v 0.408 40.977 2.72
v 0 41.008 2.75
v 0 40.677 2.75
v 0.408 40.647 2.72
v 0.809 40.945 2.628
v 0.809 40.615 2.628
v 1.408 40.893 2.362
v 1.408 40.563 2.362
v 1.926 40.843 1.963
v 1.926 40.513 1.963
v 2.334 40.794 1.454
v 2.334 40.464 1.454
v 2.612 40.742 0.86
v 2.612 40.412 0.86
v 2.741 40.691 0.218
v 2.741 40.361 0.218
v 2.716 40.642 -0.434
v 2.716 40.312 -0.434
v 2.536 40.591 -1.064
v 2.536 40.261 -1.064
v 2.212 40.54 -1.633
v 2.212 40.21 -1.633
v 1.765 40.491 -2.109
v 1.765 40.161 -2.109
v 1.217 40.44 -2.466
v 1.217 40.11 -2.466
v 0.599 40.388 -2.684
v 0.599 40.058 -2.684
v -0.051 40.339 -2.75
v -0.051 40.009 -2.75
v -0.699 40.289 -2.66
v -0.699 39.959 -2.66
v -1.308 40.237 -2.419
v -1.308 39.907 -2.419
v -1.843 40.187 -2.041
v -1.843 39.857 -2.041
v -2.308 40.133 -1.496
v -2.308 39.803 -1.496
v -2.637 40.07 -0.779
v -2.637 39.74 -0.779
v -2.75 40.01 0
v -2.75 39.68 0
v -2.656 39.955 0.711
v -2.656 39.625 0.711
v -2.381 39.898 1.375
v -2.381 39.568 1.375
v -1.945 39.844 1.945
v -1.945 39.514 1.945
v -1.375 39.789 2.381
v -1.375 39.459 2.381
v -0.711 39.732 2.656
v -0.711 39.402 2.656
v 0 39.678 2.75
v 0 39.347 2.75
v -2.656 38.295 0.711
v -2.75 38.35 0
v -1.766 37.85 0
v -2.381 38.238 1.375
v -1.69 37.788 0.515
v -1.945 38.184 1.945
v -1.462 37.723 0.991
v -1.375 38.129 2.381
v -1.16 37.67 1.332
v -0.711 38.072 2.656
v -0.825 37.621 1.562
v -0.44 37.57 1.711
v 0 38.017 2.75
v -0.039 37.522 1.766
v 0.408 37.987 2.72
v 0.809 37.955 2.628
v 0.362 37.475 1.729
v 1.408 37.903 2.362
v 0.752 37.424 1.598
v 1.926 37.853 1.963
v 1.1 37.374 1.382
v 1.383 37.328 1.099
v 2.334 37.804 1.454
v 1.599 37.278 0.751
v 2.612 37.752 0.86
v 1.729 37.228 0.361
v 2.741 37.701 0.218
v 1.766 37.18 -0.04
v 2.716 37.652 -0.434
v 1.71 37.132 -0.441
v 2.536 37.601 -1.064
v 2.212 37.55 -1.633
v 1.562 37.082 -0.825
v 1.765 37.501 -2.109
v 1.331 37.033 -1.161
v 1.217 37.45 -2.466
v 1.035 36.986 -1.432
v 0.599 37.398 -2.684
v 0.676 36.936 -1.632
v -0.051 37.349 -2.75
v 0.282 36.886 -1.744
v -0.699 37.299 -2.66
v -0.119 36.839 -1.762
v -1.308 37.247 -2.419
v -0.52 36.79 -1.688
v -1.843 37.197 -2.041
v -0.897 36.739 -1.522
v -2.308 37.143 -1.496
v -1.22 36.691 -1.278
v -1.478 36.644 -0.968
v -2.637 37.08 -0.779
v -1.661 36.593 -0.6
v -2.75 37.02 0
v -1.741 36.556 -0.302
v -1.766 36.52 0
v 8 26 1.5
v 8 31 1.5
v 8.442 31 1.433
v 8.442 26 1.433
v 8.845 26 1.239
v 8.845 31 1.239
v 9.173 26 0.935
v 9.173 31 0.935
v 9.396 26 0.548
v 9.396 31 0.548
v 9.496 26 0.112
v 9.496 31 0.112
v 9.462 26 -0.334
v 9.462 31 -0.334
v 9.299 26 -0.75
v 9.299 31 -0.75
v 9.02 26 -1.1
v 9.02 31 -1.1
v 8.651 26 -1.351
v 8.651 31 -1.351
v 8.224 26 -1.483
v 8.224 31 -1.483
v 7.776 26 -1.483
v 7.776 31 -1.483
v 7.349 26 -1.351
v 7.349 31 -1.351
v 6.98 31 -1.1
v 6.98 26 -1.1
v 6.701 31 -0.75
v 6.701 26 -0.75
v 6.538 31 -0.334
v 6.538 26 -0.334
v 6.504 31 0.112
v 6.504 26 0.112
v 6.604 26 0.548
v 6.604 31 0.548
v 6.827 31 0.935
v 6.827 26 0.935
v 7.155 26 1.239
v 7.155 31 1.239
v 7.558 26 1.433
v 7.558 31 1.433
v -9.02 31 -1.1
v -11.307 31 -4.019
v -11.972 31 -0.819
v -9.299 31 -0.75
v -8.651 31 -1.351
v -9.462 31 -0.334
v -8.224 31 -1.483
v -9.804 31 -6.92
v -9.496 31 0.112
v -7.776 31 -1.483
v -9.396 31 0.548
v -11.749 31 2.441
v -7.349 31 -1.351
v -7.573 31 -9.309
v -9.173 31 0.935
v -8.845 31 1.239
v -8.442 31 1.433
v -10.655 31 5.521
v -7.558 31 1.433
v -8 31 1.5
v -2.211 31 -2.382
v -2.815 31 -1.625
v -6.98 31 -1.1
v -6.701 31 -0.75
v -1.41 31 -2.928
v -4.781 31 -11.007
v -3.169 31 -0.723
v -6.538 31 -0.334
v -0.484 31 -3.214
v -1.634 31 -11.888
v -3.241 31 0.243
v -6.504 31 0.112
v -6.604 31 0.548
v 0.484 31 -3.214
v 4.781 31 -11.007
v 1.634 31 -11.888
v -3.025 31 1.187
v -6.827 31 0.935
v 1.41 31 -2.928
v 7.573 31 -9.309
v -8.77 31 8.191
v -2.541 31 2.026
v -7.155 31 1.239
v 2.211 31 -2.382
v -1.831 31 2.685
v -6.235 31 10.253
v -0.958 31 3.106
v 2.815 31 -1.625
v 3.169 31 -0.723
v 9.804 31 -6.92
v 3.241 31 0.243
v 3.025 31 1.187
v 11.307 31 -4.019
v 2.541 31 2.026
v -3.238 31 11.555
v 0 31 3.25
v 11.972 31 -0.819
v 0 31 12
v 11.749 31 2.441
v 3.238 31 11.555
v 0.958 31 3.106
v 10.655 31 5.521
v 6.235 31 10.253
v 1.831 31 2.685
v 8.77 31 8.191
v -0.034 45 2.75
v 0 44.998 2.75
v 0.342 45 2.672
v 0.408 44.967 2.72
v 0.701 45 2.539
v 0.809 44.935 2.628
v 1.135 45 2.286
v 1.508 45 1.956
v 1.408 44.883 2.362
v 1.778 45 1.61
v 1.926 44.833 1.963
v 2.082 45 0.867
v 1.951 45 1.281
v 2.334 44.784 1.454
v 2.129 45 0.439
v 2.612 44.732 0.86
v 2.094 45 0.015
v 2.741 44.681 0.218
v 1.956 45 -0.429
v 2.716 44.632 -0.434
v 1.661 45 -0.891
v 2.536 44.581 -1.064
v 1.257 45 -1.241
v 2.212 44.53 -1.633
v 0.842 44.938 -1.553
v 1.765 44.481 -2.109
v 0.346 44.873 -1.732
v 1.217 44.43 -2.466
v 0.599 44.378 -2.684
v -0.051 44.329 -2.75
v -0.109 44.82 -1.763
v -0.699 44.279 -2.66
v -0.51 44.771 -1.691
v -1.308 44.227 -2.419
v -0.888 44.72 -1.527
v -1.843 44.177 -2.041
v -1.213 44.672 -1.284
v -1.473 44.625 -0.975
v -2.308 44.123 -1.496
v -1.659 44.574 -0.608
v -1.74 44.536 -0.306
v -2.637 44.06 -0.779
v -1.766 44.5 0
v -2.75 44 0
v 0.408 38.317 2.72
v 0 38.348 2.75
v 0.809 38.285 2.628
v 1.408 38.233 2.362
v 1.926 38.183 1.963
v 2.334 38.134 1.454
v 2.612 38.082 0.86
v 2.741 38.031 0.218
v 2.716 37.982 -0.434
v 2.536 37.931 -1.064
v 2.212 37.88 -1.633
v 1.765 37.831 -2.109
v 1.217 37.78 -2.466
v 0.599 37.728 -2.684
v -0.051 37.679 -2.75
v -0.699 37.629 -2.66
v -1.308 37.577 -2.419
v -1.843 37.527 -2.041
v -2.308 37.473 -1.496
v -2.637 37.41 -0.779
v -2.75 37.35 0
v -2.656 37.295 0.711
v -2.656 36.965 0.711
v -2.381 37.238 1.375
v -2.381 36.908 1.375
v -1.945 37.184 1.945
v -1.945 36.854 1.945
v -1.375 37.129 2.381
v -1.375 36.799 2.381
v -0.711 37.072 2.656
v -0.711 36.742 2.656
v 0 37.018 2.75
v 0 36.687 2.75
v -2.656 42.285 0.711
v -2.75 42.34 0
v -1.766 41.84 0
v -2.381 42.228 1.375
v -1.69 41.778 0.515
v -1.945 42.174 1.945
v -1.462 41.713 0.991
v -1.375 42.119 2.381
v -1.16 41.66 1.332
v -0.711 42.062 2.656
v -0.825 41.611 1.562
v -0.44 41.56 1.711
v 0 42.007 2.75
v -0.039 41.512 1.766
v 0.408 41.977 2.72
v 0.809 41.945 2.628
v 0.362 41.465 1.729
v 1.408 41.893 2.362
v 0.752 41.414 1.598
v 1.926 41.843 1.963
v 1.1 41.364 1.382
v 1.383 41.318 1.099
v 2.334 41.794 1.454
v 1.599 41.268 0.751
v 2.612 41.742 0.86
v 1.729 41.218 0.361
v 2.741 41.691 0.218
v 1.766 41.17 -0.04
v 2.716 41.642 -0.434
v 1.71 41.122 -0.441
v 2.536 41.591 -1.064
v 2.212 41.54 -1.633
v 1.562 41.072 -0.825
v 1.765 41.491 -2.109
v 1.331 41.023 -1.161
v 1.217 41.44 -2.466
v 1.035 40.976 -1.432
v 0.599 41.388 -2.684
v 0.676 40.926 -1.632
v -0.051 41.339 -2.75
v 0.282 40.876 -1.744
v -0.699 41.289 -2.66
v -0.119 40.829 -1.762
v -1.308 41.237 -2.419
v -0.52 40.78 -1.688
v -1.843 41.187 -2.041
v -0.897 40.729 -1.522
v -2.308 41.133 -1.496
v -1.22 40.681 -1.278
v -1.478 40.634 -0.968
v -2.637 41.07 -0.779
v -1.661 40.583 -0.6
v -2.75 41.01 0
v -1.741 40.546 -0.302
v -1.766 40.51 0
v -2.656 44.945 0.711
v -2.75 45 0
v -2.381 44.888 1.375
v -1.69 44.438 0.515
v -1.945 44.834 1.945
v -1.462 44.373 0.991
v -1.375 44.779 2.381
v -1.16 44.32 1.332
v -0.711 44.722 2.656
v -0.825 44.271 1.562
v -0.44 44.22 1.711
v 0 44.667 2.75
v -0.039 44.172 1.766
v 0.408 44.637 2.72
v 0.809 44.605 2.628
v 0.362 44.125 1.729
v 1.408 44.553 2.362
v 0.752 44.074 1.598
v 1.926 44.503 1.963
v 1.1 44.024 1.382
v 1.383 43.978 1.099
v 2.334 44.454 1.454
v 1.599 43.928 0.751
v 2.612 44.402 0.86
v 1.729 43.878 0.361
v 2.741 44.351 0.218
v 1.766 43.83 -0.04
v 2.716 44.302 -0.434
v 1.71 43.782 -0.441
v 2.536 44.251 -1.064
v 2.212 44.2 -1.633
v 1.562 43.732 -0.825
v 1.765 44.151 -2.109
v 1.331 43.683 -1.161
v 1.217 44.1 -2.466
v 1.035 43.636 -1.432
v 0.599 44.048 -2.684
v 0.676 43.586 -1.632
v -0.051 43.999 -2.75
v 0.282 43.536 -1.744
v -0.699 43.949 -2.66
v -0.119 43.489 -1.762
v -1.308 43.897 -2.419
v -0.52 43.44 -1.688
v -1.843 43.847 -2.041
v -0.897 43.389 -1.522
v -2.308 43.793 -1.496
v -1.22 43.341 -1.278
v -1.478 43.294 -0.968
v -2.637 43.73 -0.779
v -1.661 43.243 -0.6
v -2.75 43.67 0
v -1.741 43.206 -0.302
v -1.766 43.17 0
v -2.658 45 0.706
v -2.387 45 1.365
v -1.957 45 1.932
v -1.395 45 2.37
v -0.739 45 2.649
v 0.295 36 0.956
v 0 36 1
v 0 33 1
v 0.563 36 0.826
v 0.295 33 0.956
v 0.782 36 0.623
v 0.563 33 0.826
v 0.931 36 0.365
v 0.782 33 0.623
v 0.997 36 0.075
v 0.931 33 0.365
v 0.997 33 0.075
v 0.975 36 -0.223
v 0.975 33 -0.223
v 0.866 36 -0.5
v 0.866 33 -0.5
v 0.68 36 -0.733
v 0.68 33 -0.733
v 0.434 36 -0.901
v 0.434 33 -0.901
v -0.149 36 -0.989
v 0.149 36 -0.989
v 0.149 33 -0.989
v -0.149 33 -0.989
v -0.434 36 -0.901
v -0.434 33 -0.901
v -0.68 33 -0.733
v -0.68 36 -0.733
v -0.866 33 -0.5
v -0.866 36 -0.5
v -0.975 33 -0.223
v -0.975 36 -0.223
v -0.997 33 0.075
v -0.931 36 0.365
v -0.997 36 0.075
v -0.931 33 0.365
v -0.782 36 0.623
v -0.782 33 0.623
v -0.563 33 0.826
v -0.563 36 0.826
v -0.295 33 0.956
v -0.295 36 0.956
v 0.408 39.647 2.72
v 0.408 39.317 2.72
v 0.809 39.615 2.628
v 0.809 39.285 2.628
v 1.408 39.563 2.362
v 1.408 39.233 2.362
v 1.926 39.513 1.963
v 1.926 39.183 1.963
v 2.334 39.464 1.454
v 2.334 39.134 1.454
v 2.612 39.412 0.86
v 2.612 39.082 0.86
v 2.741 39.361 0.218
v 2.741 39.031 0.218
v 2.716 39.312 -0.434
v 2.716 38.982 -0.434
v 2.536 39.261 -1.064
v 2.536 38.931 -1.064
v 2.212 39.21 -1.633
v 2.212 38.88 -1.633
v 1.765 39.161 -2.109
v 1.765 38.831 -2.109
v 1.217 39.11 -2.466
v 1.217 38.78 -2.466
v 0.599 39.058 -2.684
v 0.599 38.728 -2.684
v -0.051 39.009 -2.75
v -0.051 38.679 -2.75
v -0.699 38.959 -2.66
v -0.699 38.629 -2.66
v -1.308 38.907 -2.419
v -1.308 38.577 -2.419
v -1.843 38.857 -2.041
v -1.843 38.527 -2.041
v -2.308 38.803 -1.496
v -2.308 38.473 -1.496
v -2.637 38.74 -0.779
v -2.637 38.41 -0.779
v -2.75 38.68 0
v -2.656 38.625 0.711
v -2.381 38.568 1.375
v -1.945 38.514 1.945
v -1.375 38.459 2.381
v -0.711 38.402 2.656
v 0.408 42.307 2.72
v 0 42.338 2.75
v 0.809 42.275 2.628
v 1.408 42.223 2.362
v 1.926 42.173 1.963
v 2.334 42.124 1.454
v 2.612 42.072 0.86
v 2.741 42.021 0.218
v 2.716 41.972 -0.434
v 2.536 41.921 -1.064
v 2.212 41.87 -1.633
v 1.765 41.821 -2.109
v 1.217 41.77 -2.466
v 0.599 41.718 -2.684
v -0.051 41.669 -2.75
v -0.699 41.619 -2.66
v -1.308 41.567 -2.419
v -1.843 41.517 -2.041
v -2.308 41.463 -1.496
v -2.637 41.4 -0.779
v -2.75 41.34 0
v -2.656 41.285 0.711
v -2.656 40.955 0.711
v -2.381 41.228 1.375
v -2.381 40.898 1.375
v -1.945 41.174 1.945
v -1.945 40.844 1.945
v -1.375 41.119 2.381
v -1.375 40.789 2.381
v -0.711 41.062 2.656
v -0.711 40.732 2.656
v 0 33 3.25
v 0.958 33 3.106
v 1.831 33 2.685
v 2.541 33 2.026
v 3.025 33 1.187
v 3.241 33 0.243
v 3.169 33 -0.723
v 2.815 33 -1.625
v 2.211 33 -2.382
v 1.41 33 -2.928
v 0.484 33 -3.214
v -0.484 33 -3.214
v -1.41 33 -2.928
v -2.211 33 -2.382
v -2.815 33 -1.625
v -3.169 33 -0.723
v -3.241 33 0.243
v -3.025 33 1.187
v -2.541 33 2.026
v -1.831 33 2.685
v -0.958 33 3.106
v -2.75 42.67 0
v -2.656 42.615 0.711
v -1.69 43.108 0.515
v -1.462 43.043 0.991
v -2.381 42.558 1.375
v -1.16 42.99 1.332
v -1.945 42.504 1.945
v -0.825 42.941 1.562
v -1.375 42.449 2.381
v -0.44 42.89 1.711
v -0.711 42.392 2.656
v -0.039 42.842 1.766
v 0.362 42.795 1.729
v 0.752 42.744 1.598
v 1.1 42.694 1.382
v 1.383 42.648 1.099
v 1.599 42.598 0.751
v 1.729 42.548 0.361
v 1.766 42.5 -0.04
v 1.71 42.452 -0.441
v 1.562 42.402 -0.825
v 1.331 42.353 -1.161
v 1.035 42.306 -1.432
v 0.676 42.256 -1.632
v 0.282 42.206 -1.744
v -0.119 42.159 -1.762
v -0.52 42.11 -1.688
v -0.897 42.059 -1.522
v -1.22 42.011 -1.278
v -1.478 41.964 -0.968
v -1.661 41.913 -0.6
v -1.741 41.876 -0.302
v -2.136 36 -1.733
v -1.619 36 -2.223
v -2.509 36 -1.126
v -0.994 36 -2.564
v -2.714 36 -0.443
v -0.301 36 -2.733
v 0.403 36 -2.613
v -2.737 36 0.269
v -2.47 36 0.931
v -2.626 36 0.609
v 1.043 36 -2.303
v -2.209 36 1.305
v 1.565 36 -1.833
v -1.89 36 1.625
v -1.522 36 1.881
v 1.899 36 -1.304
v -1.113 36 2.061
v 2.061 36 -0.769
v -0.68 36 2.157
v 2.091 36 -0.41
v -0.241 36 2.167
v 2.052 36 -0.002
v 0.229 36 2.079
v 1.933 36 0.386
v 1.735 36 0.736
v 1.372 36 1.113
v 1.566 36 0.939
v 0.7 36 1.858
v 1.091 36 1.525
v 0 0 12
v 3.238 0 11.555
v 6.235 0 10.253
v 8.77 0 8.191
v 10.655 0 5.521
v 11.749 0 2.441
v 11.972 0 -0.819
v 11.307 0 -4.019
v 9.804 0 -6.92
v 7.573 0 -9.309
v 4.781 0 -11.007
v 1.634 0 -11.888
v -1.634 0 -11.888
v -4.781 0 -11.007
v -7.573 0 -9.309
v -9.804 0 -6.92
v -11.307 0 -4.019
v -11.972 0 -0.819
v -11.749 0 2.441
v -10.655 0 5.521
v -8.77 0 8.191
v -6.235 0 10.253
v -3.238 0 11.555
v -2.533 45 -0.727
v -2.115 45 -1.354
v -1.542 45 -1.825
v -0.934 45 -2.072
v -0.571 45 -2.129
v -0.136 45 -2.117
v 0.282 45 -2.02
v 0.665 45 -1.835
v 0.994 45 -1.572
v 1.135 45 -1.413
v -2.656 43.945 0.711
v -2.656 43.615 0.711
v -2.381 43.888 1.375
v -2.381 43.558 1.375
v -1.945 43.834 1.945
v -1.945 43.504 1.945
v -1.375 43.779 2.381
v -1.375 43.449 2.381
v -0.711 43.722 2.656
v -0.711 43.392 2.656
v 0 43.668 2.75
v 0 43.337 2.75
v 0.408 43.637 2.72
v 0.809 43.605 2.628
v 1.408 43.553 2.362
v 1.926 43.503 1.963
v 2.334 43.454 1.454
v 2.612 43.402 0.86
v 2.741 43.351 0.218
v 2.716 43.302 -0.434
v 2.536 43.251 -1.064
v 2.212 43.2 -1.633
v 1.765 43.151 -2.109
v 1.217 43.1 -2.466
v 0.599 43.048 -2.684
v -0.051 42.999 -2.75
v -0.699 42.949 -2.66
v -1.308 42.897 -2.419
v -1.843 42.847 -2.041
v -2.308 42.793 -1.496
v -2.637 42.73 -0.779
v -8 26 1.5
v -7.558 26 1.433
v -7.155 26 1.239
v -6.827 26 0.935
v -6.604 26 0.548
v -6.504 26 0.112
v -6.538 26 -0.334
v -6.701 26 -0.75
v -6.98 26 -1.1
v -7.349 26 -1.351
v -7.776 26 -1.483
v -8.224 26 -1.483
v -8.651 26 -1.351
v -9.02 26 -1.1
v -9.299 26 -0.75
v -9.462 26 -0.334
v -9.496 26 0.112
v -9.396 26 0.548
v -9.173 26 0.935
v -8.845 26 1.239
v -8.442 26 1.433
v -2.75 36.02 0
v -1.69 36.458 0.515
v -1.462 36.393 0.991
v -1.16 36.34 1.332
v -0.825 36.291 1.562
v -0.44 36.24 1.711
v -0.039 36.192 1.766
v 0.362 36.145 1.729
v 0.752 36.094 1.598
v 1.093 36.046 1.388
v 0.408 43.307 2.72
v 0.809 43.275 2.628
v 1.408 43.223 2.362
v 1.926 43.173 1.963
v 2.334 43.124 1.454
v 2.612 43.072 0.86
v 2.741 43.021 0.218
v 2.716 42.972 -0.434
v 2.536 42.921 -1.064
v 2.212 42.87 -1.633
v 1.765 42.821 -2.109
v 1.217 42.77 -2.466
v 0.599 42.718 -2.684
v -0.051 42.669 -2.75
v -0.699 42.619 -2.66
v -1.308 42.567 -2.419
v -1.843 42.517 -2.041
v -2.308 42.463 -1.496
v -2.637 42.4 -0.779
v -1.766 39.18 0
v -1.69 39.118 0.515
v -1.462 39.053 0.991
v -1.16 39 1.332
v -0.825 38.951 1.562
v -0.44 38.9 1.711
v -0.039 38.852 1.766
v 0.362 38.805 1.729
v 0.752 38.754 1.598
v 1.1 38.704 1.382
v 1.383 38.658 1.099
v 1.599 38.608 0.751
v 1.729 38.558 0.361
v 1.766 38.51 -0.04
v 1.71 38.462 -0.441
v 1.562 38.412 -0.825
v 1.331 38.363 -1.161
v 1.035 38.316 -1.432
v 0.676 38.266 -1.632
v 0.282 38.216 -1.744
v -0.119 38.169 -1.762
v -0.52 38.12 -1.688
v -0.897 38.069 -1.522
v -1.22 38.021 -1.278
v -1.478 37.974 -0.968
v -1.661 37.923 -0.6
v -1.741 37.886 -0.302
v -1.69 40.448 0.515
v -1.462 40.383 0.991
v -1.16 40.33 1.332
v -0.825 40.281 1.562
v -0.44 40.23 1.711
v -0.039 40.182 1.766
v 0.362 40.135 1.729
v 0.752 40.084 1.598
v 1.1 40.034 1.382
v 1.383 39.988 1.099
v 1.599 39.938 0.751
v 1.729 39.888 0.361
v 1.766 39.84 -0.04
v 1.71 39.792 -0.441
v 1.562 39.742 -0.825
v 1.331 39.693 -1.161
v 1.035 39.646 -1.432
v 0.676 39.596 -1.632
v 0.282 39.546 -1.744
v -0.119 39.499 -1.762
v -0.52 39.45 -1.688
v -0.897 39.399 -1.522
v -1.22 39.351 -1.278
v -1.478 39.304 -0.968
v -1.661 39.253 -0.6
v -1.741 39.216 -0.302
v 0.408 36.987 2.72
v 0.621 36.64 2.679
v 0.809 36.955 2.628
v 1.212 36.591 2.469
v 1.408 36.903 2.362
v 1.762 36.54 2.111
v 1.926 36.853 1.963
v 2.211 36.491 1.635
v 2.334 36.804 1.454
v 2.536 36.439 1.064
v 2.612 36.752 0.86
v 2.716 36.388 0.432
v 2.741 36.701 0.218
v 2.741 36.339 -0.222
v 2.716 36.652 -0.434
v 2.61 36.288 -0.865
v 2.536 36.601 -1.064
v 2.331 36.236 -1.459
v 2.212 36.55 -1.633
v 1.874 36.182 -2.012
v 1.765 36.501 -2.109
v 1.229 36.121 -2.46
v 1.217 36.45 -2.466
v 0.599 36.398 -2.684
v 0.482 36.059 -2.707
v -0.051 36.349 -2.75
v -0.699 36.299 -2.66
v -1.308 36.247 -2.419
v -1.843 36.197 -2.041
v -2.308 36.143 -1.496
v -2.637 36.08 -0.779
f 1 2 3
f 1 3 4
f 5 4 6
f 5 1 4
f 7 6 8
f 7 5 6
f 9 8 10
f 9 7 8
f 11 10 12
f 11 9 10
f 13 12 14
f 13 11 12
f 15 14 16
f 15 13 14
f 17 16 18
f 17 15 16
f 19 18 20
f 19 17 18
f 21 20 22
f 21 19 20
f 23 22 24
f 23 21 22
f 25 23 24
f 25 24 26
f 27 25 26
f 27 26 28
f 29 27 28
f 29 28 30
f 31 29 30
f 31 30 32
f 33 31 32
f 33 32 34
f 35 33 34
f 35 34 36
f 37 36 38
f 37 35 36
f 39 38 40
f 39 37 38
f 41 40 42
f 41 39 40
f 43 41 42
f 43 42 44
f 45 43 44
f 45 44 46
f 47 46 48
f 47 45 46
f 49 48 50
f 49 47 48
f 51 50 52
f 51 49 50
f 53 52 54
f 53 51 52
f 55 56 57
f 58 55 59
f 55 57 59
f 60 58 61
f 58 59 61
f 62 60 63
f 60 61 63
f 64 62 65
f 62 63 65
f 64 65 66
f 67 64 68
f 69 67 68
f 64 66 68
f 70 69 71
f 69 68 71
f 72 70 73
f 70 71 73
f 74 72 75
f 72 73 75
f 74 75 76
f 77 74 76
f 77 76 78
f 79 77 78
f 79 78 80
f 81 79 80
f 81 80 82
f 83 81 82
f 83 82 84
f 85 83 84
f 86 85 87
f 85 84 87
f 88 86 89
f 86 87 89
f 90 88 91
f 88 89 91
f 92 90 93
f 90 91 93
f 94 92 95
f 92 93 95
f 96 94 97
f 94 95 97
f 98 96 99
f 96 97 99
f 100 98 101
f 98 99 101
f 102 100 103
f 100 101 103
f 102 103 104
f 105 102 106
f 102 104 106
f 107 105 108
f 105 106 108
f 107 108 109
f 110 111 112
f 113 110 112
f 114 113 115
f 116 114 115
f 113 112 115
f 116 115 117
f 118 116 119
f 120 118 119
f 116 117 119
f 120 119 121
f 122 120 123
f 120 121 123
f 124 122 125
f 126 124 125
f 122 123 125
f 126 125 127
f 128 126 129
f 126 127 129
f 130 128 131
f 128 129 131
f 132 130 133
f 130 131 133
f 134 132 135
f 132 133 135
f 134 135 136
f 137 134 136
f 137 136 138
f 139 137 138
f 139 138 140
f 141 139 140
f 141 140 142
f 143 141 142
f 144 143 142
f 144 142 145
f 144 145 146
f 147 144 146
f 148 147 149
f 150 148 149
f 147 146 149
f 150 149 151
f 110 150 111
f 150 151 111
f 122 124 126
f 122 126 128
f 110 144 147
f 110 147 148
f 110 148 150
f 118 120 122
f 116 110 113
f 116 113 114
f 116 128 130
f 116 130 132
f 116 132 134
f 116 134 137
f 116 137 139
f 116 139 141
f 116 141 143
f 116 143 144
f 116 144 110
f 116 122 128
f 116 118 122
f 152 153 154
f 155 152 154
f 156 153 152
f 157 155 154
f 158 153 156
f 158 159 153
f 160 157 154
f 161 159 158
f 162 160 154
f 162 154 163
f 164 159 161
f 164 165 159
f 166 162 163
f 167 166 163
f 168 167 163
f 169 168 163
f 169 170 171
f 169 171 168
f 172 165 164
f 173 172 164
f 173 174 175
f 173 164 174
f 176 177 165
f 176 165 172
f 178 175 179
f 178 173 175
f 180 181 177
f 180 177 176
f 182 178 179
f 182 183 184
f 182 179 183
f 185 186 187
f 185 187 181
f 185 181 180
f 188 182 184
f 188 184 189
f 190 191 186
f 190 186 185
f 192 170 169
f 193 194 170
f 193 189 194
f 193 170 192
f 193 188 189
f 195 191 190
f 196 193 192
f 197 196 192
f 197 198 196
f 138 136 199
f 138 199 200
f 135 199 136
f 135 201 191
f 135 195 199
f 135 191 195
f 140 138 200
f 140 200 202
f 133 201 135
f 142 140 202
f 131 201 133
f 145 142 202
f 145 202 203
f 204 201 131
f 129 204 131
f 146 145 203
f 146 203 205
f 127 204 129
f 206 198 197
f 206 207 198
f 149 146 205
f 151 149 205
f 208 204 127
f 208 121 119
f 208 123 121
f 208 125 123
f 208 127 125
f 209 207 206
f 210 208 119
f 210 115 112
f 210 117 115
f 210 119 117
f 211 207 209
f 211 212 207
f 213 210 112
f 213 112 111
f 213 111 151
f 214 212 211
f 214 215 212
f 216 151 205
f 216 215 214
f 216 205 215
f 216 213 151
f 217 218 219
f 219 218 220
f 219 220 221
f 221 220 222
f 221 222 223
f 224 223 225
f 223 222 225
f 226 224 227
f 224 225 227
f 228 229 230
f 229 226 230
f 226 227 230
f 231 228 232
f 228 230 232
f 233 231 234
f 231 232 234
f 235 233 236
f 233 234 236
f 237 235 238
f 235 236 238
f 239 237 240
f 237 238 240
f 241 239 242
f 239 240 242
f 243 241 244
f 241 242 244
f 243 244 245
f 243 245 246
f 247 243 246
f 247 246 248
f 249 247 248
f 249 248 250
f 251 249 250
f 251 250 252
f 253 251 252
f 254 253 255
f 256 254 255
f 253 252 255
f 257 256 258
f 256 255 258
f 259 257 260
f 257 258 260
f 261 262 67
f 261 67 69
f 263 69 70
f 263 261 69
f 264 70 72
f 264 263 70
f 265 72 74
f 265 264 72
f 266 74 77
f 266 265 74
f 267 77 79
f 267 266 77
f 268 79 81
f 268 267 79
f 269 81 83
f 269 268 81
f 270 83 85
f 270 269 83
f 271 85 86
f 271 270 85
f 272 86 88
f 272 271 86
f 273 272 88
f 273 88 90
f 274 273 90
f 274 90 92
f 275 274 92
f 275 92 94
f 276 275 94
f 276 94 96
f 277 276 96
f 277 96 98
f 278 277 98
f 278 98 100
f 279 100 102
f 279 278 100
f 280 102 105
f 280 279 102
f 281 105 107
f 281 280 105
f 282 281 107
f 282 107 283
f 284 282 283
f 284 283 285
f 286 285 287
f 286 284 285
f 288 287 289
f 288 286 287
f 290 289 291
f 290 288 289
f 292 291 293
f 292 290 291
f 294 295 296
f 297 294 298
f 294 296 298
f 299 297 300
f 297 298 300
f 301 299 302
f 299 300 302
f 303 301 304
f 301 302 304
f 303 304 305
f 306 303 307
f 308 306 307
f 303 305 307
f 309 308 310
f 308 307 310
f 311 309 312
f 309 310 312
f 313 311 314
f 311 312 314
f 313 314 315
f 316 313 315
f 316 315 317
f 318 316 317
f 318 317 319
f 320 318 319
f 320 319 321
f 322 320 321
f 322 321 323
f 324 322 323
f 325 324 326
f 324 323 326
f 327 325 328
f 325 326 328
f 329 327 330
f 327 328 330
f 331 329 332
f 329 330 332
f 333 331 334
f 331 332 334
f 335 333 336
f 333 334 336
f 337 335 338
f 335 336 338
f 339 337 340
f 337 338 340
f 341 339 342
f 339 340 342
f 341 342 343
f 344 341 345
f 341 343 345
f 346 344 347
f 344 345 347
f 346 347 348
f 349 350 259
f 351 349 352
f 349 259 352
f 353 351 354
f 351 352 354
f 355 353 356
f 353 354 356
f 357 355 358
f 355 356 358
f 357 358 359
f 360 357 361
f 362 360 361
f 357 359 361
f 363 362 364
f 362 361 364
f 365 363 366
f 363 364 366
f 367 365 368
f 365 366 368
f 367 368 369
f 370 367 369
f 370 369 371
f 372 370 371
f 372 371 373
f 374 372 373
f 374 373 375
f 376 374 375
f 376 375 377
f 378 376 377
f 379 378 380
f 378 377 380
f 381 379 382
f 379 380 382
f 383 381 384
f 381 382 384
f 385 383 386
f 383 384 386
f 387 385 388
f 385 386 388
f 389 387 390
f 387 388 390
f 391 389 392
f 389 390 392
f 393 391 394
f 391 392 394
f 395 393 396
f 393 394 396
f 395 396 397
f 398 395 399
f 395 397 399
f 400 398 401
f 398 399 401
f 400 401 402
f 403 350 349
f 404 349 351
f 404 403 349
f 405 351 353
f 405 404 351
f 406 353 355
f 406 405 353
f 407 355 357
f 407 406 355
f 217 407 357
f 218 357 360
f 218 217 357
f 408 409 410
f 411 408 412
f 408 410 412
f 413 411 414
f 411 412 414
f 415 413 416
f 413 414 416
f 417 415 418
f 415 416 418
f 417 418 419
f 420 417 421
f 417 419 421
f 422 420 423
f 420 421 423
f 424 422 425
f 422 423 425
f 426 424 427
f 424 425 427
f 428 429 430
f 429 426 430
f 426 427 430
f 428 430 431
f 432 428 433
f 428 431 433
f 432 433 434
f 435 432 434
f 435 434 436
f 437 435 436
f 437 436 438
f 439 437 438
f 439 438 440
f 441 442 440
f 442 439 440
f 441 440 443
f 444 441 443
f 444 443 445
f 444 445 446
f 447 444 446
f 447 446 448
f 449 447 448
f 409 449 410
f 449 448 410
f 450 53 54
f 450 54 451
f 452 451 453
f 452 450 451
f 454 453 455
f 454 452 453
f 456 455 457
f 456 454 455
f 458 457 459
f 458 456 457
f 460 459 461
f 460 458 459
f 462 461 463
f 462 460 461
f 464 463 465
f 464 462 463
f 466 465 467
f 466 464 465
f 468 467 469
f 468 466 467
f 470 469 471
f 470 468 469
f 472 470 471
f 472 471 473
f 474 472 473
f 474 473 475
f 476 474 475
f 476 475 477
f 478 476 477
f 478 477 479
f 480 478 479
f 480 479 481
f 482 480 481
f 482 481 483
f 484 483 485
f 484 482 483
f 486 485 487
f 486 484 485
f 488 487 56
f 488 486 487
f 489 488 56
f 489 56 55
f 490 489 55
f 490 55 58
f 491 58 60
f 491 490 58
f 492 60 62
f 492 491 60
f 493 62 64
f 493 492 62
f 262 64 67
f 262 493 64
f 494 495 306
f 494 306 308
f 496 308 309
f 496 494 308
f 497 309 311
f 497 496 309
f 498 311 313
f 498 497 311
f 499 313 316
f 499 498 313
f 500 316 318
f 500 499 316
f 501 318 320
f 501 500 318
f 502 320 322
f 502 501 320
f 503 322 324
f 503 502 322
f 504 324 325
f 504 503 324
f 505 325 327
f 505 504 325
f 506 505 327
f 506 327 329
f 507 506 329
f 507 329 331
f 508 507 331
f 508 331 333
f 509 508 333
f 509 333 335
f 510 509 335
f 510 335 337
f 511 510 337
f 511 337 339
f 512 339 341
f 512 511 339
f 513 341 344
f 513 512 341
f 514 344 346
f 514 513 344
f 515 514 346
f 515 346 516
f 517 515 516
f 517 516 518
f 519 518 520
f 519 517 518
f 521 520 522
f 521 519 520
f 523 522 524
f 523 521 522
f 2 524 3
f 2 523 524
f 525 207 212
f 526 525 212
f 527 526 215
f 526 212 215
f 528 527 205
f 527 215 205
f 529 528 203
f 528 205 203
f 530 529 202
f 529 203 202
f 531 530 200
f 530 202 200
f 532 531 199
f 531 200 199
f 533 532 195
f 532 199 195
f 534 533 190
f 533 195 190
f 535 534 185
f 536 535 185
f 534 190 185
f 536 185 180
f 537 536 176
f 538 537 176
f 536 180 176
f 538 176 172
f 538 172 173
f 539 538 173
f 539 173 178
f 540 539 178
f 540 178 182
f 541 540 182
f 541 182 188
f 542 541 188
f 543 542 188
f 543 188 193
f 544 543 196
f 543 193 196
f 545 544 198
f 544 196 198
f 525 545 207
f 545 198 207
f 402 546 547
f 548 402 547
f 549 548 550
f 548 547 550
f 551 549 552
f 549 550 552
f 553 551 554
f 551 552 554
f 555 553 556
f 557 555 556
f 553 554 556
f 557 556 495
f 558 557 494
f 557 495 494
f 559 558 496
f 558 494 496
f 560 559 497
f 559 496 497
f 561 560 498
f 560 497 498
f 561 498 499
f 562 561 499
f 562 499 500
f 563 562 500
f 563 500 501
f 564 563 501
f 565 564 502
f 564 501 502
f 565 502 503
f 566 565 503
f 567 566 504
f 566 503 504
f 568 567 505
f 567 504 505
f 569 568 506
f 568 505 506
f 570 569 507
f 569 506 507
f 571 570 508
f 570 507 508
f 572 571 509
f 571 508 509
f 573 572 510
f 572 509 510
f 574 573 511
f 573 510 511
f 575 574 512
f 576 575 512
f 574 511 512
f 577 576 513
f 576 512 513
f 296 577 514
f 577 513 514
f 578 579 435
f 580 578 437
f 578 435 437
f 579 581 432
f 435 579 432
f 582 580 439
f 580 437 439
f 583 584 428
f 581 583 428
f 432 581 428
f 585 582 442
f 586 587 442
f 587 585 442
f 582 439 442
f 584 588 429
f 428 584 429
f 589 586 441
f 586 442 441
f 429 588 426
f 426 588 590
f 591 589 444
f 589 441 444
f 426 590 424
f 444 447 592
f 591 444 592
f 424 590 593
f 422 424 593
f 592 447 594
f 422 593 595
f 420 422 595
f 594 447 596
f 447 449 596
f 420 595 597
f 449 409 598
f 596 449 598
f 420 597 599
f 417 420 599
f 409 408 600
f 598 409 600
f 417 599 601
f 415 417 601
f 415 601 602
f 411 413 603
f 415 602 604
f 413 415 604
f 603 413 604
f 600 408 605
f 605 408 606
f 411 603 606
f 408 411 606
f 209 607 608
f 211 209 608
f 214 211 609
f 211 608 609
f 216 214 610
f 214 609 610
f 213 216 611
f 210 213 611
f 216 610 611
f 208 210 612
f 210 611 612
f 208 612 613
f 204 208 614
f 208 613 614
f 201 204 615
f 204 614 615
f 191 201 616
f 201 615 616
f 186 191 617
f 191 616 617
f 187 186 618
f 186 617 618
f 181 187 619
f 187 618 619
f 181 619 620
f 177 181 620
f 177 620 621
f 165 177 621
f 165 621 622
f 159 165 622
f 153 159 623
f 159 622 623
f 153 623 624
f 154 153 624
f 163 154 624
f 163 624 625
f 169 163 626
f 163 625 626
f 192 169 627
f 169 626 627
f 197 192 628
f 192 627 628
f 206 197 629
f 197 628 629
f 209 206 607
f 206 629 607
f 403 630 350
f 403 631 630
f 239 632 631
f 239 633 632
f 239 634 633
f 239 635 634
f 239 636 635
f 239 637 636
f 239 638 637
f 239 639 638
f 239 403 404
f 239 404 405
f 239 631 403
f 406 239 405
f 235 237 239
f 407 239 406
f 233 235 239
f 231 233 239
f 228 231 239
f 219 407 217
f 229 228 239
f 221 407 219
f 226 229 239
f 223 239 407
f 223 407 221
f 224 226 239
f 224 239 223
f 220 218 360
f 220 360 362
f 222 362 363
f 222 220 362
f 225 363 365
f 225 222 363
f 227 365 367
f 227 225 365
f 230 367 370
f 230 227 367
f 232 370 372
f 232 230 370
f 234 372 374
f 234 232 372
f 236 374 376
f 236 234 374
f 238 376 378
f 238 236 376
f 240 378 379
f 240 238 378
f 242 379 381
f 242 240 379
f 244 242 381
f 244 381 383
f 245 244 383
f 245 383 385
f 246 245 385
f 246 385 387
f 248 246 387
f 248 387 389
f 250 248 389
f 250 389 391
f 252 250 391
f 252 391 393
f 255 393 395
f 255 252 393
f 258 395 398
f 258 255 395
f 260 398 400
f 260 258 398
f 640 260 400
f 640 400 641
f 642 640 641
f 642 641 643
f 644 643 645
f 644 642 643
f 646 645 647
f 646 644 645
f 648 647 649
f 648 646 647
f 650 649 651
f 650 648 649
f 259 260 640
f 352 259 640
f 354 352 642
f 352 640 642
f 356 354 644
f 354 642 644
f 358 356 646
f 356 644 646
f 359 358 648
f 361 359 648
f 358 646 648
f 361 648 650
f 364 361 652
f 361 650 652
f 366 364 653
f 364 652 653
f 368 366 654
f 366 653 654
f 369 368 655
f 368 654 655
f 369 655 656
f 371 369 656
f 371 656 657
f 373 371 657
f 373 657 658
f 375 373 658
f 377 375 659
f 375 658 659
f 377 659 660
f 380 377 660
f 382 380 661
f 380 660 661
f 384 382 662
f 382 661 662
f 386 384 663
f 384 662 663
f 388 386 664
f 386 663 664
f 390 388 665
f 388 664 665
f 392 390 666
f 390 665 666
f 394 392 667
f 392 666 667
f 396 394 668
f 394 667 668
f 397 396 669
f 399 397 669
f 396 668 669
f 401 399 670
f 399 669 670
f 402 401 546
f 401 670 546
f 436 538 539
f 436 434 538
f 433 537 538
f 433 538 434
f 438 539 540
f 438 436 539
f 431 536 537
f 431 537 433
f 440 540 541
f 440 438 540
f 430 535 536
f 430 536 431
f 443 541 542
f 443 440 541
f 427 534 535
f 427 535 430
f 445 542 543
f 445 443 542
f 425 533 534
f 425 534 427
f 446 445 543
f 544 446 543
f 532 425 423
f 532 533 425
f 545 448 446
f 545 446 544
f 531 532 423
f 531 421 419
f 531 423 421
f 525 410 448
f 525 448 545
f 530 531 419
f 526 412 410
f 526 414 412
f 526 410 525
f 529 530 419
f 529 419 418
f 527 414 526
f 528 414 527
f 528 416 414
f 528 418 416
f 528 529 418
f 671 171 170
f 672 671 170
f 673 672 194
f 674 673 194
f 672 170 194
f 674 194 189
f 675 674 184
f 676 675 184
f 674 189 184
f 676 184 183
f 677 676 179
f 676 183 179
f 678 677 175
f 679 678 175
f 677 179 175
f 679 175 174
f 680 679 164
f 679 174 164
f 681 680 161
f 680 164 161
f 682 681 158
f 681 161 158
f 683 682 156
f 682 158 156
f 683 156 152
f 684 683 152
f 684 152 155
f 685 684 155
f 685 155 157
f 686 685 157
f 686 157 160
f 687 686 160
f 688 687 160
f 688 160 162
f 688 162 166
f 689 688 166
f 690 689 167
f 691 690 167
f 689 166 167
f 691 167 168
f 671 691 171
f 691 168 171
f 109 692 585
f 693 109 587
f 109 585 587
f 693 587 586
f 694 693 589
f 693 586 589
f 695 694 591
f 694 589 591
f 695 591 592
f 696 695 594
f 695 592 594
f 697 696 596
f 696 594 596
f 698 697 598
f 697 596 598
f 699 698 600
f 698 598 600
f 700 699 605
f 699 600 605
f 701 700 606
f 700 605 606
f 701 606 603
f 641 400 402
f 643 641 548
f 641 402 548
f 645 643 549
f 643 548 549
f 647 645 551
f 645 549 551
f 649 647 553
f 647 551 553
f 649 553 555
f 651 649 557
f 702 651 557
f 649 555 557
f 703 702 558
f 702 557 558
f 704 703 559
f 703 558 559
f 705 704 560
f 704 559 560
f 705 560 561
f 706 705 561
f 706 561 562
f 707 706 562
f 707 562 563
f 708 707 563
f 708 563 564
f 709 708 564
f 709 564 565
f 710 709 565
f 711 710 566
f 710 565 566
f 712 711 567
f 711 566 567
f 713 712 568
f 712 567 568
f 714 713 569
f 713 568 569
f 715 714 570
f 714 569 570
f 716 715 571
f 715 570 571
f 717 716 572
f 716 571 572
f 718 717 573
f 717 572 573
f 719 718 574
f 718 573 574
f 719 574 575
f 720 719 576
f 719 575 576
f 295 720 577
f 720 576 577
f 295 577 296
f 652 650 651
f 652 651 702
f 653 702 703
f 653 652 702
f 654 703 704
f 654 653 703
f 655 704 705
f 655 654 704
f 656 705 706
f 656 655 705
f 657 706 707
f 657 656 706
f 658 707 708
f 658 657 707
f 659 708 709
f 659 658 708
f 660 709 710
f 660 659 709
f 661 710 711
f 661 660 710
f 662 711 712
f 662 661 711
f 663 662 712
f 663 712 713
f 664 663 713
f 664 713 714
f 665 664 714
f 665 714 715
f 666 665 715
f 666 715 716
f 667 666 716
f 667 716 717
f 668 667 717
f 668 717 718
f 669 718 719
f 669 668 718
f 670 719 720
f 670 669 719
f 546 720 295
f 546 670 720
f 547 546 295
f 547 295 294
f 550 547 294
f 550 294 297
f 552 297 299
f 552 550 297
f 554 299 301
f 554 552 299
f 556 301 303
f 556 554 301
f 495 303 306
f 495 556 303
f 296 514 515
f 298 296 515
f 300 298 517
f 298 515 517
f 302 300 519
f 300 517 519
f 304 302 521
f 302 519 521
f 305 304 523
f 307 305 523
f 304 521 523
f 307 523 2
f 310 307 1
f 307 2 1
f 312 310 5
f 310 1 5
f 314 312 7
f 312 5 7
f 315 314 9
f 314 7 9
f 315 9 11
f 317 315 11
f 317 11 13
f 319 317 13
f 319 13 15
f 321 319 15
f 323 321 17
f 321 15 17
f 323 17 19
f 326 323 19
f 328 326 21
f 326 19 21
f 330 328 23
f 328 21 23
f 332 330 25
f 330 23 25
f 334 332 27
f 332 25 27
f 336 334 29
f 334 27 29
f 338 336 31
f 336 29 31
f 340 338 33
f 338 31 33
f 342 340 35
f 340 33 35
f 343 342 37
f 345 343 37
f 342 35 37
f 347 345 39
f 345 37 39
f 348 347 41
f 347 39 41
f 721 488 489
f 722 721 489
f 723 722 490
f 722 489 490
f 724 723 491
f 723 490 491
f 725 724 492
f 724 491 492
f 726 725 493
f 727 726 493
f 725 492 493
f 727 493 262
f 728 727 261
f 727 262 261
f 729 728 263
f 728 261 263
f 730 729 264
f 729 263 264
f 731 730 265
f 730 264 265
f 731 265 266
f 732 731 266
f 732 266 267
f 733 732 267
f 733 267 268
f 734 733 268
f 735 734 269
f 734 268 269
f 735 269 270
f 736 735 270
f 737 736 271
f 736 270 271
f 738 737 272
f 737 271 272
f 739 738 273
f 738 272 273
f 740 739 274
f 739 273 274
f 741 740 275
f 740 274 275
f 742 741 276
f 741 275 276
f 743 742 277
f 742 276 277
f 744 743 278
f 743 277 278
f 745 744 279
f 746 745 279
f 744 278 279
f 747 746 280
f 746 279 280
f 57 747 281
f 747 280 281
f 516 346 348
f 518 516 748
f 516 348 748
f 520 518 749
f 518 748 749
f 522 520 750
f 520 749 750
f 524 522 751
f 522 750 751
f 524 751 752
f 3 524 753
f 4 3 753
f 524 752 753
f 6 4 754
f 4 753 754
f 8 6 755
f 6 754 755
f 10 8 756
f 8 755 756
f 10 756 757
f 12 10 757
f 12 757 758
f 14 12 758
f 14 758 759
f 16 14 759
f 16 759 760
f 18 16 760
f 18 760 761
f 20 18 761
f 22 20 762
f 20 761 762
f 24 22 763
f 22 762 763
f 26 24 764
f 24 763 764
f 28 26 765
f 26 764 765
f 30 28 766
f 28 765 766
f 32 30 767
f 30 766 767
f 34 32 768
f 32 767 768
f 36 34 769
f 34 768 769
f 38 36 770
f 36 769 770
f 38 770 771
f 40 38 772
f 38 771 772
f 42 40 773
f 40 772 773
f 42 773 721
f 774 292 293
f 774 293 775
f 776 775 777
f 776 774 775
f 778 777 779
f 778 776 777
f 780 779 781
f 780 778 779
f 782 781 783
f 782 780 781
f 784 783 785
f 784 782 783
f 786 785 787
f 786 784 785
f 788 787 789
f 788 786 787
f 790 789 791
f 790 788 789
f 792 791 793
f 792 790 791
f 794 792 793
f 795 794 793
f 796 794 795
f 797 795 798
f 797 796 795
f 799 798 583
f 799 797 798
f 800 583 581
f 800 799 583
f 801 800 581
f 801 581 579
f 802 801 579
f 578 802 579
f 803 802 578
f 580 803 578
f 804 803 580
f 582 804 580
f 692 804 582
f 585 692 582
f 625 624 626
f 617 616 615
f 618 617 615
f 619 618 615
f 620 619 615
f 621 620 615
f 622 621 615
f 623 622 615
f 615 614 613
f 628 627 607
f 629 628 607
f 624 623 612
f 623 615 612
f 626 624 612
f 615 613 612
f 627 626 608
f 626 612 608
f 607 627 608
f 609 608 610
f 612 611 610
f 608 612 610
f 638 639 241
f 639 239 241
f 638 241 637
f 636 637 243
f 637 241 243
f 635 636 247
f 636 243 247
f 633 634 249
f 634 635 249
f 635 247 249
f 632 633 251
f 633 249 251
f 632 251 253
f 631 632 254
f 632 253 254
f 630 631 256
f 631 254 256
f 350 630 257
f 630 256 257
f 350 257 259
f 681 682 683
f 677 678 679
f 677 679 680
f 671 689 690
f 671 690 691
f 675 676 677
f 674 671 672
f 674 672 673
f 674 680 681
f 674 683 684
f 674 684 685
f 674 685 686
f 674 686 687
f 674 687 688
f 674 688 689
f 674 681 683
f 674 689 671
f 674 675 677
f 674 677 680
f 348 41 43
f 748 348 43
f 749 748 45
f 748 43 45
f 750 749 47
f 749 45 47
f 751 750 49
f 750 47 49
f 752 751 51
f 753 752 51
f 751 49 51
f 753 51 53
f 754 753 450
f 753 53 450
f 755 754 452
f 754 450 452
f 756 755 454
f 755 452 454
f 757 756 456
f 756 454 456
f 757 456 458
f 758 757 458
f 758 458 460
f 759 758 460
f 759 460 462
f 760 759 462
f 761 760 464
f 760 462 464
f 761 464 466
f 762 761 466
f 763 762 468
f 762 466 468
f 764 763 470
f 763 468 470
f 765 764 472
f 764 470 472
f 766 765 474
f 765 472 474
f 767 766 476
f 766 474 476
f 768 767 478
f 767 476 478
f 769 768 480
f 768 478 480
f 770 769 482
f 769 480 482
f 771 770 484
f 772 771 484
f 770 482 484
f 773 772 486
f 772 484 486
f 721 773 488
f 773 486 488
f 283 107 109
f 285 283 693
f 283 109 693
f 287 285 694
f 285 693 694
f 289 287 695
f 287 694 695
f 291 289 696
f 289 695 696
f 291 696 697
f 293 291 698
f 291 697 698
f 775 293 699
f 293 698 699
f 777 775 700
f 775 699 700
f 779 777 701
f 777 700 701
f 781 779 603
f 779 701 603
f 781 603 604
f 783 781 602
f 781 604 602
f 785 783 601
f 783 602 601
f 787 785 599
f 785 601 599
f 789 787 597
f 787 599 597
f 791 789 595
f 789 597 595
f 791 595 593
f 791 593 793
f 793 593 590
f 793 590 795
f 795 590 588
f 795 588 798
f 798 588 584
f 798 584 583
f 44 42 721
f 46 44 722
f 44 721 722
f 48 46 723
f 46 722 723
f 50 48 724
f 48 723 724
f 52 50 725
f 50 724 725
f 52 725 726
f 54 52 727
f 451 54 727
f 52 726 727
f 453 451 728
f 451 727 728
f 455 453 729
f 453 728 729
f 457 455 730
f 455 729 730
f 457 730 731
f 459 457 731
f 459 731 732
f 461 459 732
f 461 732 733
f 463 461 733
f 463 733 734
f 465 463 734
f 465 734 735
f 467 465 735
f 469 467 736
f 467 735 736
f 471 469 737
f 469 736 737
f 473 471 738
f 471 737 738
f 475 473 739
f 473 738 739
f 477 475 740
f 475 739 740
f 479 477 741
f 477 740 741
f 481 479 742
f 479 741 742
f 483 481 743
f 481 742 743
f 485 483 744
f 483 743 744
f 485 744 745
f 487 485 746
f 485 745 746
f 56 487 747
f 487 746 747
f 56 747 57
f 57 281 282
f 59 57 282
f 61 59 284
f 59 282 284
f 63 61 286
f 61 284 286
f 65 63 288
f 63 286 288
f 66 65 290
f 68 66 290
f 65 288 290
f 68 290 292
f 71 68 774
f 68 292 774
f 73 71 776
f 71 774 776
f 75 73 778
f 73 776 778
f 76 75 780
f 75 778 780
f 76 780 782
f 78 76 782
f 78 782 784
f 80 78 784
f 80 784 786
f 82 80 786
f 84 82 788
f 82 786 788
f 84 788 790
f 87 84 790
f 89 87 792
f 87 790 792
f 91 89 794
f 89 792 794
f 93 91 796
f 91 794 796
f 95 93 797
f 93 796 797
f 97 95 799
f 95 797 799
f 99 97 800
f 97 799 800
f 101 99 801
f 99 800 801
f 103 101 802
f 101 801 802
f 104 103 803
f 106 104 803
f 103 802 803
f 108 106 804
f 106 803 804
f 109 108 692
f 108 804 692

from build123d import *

# Parameters (mm, degrees)
SKETCH1_R           = 12
BOSS_EXTRUDE1_DEPTH = 31
SKETCH2_R           = 1.5
CUT_EXTRUDE1_DEPTH  = 5
SKETCH3_R           = 3.25
BOSS_EXTRUDE2_DEPTH = 2
SKETCH4_R           = 1
BOSS_EXTRUDE3_DEPTH = 12
SKETCH5_R           = 2.75
BOSS_EXTRUDE4_DEPTH = 9
CUT_SWEEP6_PITCH    = 1.33


with BuildPart() as part:
    # Sketch1 → Boss-Extrude1 (new body)
    with BuildSketch(Plane(origin=(0, 0, 0), x_dir=(1, 0, 0), z_dir=(0, 1, 0))):
        with Locations(Location((0, 0, 0), (0, 0, 270))):
            Circle(SKETCH1_R)
    extrude(amount=BOSS_EXTRUDE1_DEPTH)

    # Sketch2 → Cut-Extrude1 (cut)
    with BuildSketch(Plane(origin=(0, 31, 0), x_dir=(1, 0, 0), z_dir=(0, 1, 0))):
        with Locations(Location((8, 0, 0), (0, 0, 270))):
            Circle(SKETCH2_R)
        with Locations(Location((-8, 0, 0), (0, 0, 270))):
            Circle(SKETCH2_R)
    extrude(amount=-CUT_EXTRUDE1_DEPTH, mode=Mode.SUBTRACT)

    # Sketch3 → Boss-Extrude2 (add)
    with BuildSketch(Plane(origin=(0, 31, 0), x_dir=(1, 0, 0), z_dir=(0, 1, 0))):
        with Locations(Location((0, 0, 0), (0, 0, 270))):
            Circle(SKETCH3_R)
    extrude(amount=BOSS_EXTRUDE2_DEPTH)

    # Sketch4 → Boss-Extrude3 (add)
    with BuildSketch(Plane(origin=(0, 33, 0), x_dir=(1, 0, 0), z_dir=(0, 1, 0))):
        with Locations(Location((0, 0, 0), (0, 0, 270))):
            Circle(SKETCH4_R)
    extrude(amount=BOSS_EXTRUDE3_DEPTH)

    # Sketch5 → Boss-Extrude4 (add)
    with BuildSketch(Plane(origin=(0, 45, 0), x_dir=(1, 0, 0), z_dir=(0, 1, 0))):
        with Locations(Location((0, 0, 0), (0, 0, 270))):
            Circle(SKETCH5_R)
    extrude(amount=-BOSS_EXTRUDE4_DEPTH)

    # Cut-Sweep6: arcs per turn and ends read off the stored shape
    # Cut-Sweep6: the profile of Sketch6 profile screwed along a left-hand helix through 9 turns, 8 arcs to a turn; built about Z, then put on its axis
    cut_sweep6_z = Axis((0, 0, 0), (0, 0, 1))
    cut_sweep6_corners = [(2.7503, 0, -1.330152512), (1.766472482, 0, -0.83), (2.7503, 0, -0.329847488)]
    with BuildLine(mode=Mode.PRIVATE) as cut_sweep6_profile:
        Line(cut_sweep6_corners[0], cut_sweep6_corners[1])
        Line(cut_sweep6_corners[1], cut_sweep6_corners[2])
        Line(cut_sweep6_corners[2], cut_sweep6_corners[0])
    cut_sweep6_cap = Face(cut_sweep6_profile.wire())
    cut_sweep6_turn_angles = [0, -22.5, -45, -67.5, -90, -112.5, -135, -157.5, -180, -202.5, -225, -247.5, -270, -292.5, -315, -337.5, -360]
    cut_sweep6_turn_weights = [1, 0.9238795325112867, 1, 0.9238795325112867, 1, 0.9238795325112867, 1, 0.9238795325112867, 1, 0.9238795325112867, 1, 0.9238795325112867, 1, 0.9238795325112867, 1, 0.9238795325112867, 1]
    cut_sweep6_turn_rails = [Edge.make_bspline([Vector(p[0], p[1], 0).rotate(cut_sweep6_z, cut_sweep6_turn_angles[k]) / cut_sweep6_turn_weights[k] + Vector(0, 0, p[2] + -CUT_SWEEP6_PITCH * cut_sweep6_turn_angles[k] / 360) for k in range(17)], [0, 0, 0, 1, 1, 2, 2, 3, 3, 4, 4, 5, 5, 6, 6, 7, 7, 8, 8, 8], 2, cut_sweep6_turn_weights) for p in cut_sweep6_corners]
    cut_sweep6_turn_sides = [Face.make_surface_from_curves(cut_sweep6_turn_rails[p[0]], cut_sweep6_turn_rails[p[1]]) for p in [(0, 1), (1, 2), (2, 0)]]
    cut_sweep6 = Plane(origin=(0, 45, 0), x_dir=(-1, 0, 0), z_dir=(0, -1, 0)) * Solid(Shell([*[p.moved(Location((0, 0, CUT_SWEEP6_PITCH * i))) for i in range(9) for p in cut_sweep6_turn_sides], cut_sweep6_cap, cut_sweep6_cap.rotate(cut_sweep6_z, -3240).moved(Location((0, 0, -CUT_SWEEP6_PITCH * -3240 / 360)))]))
    add(cut_sweep6, mode=Mode.SUBTRACT)


solid = part.part
